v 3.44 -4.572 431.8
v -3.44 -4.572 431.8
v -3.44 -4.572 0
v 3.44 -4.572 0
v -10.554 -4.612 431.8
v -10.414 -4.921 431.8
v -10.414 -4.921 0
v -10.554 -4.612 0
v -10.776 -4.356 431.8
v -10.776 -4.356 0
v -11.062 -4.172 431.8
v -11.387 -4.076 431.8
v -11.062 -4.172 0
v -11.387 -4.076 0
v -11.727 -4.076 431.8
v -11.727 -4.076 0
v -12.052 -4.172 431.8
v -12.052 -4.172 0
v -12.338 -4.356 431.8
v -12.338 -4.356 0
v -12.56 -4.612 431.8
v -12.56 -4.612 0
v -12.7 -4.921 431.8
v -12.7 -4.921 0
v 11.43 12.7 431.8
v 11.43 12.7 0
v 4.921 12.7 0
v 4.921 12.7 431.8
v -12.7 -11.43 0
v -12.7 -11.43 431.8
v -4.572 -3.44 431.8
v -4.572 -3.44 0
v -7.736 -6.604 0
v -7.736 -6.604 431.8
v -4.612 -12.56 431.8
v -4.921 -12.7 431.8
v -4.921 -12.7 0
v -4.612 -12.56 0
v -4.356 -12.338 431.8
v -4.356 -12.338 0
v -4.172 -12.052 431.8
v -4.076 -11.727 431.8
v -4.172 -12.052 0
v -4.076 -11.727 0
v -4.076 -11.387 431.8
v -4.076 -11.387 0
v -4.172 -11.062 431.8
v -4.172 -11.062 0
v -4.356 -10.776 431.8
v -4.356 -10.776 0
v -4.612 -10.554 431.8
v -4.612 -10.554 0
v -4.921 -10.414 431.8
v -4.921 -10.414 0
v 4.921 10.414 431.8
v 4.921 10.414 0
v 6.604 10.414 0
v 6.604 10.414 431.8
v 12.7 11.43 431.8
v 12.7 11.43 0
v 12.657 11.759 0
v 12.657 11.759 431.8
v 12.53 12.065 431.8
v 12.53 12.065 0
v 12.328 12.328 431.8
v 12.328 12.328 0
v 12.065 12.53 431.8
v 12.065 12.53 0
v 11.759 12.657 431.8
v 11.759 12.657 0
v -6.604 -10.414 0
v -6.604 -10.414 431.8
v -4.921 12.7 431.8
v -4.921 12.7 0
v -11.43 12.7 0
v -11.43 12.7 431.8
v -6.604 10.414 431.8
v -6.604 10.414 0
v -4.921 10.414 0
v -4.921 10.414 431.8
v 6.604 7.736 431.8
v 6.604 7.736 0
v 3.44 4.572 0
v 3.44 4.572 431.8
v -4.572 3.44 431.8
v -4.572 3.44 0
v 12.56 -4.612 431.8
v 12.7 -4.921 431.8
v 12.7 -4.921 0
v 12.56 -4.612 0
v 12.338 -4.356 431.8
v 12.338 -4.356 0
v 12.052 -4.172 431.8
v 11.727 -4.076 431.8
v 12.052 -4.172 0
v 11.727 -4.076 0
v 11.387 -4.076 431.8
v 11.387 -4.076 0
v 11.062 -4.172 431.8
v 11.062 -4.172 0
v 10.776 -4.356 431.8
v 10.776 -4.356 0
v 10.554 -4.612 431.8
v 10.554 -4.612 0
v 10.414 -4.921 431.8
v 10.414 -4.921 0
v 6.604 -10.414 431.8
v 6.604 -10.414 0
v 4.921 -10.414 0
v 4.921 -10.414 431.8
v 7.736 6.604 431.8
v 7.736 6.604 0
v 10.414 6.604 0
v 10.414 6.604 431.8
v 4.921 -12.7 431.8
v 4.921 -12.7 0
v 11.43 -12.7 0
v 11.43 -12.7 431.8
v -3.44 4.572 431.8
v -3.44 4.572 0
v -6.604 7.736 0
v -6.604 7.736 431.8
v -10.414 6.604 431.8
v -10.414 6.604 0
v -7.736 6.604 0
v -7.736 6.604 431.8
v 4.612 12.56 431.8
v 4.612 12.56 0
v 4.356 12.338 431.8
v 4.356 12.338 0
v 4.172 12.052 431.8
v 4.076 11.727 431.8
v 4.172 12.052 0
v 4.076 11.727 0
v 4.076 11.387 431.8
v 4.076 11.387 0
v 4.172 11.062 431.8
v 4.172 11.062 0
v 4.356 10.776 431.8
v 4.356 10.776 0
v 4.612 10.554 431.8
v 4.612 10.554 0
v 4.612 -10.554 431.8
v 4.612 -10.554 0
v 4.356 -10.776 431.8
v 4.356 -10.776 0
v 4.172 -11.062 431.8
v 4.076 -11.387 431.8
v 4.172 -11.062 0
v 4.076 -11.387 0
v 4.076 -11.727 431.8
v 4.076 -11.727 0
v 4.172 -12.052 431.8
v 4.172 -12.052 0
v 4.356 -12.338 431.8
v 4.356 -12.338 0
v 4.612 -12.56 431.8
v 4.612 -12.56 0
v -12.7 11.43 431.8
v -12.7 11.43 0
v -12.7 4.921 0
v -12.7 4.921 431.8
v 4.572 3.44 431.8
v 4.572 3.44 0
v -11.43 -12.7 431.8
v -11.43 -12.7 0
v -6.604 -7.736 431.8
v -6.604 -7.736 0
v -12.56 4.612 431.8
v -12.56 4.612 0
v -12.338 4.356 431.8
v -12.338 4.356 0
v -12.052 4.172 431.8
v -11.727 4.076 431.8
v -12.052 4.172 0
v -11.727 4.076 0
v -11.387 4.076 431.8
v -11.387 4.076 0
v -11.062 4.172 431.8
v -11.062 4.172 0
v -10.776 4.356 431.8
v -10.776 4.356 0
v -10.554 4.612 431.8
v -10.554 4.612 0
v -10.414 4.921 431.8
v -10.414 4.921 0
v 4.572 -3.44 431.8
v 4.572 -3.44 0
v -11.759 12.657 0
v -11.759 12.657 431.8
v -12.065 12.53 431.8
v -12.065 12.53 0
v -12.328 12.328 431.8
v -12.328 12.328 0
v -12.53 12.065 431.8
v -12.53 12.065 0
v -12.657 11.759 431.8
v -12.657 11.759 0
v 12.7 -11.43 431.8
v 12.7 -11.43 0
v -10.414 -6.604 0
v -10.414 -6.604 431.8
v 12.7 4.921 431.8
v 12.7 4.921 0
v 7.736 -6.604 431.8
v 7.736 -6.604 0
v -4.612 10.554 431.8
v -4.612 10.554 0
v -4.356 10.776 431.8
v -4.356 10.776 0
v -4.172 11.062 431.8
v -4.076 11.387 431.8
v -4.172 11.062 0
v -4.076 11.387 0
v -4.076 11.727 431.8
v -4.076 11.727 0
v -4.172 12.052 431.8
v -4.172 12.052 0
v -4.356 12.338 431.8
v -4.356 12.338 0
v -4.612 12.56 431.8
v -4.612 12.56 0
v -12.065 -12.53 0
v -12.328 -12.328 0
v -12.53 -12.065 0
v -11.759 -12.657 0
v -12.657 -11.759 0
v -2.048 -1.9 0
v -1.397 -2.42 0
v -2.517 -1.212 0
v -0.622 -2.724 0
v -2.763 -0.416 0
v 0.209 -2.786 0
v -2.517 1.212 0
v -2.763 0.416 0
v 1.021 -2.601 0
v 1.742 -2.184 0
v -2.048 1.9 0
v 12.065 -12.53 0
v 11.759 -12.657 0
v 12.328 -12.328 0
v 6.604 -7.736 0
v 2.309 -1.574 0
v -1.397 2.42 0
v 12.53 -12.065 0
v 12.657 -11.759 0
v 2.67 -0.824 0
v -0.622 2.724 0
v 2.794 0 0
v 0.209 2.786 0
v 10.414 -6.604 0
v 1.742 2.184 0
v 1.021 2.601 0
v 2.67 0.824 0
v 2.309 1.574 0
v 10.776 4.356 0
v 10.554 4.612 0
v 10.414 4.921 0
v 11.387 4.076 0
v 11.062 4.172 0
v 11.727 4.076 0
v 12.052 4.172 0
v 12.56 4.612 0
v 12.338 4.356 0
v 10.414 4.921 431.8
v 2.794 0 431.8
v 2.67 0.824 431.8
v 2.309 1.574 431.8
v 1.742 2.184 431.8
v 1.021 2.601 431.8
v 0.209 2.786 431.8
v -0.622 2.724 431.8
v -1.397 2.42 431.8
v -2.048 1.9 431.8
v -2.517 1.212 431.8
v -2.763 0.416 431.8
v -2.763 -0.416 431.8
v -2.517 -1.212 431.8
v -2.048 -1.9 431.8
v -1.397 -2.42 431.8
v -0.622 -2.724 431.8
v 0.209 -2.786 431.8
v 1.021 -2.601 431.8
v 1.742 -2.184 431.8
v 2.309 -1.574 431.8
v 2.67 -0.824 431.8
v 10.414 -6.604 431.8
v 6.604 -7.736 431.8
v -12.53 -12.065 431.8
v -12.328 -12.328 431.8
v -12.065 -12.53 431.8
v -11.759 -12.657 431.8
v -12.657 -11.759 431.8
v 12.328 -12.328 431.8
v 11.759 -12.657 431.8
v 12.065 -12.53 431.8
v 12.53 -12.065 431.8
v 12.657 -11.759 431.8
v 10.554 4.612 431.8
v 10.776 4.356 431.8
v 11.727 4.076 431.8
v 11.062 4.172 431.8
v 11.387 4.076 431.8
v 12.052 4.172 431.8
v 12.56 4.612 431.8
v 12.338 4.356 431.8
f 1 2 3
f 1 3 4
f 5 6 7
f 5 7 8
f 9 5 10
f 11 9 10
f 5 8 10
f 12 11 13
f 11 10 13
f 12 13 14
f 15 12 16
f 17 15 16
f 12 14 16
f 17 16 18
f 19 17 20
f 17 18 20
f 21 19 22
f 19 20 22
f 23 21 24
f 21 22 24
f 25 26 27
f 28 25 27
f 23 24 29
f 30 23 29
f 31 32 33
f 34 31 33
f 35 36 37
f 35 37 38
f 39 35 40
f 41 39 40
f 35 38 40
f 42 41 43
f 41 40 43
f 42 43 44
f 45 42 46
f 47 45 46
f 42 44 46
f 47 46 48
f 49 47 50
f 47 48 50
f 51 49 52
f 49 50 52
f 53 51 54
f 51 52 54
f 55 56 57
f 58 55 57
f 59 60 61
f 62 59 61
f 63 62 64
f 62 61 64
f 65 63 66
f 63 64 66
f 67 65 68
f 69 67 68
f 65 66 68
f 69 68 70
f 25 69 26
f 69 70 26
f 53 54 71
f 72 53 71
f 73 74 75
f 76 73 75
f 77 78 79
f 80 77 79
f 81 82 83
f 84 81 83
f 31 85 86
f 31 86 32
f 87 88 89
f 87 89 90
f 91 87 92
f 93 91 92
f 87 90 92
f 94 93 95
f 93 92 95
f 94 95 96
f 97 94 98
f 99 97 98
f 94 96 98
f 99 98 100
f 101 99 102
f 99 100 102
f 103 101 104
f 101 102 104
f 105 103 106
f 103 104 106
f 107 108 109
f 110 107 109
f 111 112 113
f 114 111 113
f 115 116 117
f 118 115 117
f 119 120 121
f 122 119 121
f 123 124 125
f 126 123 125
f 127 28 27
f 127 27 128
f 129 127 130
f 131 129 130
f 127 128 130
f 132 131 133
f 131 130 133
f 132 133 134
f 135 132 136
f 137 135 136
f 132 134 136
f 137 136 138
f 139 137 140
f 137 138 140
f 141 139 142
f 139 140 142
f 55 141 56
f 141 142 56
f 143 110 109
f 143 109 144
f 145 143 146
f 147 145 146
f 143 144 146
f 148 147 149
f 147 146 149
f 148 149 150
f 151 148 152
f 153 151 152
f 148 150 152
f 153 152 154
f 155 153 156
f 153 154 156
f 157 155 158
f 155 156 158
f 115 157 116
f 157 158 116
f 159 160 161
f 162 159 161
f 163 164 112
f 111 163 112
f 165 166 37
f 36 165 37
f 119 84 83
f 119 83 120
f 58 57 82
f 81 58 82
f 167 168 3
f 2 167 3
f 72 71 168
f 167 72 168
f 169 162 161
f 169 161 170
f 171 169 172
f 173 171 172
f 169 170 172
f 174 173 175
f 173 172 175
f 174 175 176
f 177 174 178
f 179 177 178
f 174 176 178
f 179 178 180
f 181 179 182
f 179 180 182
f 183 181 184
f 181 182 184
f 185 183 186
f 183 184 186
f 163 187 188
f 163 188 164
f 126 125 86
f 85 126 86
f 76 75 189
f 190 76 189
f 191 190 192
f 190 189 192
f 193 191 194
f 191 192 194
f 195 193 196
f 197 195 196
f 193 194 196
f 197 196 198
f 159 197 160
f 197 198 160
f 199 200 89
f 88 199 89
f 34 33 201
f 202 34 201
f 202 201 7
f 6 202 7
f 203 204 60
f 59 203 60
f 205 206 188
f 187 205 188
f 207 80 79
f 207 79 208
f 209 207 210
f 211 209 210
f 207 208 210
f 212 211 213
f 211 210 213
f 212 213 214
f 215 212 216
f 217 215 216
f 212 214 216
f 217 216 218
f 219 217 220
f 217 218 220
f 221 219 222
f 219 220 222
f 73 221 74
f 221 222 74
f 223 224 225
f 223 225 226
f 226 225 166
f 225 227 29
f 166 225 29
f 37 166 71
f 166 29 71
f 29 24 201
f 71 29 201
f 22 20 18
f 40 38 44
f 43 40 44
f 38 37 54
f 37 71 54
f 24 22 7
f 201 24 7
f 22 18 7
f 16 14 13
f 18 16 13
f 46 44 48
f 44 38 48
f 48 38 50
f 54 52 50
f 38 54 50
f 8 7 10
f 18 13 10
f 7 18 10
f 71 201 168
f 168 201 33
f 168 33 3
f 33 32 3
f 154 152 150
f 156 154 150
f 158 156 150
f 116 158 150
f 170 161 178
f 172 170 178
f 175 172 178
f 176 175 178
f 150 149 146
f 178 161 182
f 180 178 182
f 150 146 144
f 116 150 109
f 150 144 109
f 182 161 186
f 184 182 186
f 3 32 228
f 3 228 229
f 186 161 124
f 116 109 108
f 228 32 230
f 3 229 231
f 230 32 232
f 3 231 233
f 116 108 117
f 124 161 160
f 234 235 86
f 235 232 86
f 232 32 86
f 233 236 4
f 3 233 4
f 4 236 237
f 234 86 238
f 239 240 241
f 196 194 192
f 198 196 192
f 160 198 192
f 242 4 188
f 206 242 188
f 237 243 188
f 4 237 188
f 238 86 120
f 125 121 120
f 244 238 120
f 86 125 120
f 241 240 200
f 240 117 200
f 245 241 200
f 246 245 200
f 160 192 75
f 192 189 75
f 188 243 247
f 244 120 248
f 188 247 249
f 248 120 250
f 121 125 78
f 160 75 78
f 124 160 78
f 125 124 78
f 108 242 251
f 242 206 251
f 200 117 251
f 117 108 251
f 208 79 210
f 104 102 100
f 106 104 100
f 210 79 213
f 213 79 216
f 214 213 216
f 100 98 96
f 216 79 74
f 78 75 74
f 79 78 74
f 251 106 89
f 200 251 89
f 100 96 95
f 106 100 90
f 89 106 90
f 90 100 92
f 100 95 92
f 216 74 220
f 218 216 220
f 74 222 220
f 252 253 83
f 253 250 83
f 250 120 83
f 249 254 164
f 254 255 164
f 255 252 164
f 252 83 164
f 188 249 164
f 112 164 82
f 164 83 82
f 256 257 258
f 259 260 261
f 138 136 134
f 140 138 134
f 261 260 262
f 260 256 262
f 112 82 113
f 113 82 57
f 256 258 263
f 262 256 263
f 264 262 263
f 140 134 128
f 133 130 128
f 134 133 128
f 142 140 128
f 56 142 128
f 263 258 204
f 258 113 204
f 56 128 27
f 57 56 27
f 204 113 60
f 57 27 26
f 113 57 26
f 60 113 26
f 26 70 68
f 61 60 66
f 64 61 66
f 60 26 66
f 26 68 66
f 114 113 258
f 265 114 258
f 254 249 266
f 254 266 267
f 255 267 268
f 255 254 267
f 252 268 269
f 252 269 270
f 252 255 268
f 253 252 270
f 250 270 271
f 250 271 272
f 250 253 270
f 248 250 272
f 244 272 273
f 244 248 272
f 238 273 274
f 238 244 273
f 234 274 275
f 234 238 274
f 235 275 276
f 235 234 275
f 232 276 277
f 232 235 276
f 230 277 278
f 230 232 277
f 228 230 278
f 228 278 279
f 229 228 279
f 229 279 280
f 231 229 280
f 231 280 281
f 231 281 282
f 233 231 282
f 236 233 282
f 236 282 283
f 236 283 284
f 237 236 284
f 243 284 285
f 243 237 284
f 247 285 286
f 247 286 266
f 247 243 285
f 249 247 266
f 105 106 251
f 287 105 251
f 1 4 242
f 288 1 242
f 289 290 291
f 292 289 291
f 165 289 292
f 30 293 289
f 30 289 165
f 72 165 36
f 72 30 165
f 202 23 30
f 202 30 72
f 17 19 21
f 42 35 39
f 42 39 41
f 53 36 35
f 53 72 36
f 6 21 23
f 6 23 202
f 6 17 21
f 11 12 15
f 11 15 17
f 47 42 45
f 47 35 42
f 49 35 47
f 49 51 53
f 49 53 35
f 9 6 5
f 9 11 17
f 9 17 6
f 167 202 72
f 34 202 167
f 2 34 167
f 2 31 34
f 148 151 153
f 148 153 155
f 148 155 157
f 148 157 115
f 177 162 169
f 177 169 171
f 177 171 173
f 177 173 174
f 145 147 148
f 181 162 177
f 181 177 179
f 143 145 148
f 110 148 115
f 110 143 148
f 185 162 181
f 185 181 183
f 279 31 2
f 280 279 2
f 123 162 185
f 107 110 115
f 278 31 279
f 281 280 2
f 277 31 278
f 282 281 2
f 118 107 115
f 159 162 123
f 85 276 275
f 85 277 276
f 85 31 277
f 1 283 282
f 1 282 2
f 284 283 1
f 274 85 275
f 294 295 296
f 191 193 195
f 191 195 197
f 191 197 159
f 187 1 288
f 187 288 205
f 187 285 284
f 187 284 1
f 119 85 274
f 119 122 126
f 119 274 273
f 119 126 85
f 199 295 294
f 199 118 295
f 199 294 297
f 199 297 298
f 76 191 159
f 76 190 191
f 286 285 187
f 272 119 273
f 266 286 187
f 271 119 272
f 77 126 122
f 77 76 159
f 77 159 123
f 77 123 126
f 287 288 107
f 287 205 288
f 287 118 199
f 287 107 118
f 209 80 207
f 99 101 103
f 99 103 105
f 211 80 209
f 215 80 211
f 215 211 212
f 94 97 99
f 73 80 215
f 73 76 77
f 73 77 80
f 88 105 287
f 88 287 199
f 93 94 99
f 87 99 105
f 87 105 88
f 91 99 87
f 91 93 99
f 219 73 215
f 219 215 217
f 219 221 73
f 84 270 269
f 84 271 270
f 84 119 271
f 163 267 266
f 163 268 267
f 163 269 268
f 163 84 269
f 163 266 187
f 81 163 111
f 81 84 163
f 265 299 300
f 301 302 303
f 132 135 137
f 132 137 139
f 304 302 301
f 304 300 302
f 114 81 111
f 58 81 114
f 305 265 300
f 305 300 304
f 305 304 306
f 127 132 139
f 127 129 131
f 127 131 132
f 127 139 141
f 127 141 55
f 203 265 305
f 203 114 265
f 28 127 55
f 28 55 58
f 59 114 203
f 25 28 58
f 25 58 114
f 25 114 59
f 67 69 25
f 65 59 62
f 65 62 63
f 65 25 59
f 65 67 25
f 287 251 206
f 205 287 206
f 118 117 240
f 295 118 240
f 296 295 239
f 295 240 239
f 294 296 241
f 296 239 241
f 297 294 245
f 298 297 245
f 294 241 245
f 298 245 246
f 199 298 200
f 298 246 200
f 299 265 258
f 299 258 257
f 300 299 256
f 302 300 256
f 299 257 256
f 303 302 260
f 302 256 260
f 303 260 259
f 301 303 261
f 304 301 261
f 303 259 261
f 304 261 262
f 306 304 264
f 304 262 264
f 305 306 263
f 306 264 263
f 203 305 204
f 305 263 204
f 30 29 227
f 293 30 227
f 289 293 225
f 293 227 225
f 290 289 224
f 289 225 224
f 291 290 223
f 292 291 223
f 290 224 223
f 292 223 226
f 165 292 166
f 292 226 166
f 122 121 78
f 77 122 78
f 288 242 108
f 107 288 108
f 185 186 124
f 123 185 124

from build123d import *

# Parameters (mm, degrees)
F0_R     = 2.794
F1_DEPTH = 431.8


with BuildPart() as f1:
    # F0 (on Top) → F1 (new body)
    with BuildSketch(Plane.XY):
        Polygon((4.572, -3.440488), (4.572, -4.572), (3.440488, -4.572), (6.604, -7.735512), (6.604, -10.414), (10.414, -10.414), (10.414, -6.604), (7.735512, -6.604), align=None)
        Polygon((3.440488, -4.572), (4.572, -4.572), (4.572, -3.440488), (4.572, 3.440488), (4.572, 4.572), (3.440488, 4.572), (-3.440488, 4.572), (-4.572, 4.572), (-4.572, 3.440488), (-4.572, -3.440488), (-4.572, -4.572), (-3.440488, -4.572), align=None)
        Circle(F0_R, mode=Mode.SUBTRACT)
        Polygon((-6.604, -7.735512), (-3.440488, -4.572), (-4.572, -4.572), (-4.572, -3.440488), (-7.735512, -6.604), (-10.414, -6.604), (-10.414, -10.414), (-6.604, -10.414), align=None)
        Polygon((4.572, 4.572), (4.572, 3.440488), (7.735512, 6.604), (10.414, 6.604), (10.414, 10.414), (6.604, 10.414), (6.604, 7.735512), (3.440488, 4.572), align=None)
        with BuildLine():
            Line((10.414, -10.414), (6.604, -10.414))
            Line((6.604, -10.414), (4.92125, -10.414))
            ThreePointArc((4.92125, -10.414), (4.064, -11.557), (4.92125, -12.7))
            Line((4.92125, -12.7), (10.414, -12.7))
            Line((10.414, -12.7), (10.414, -10.414))
        make_face()
        with BuildLine():
            Line((10.414, -4.92125), (10.414, -6.604))
            Line((10.414, -6.604), (10.414, -10.414))
            Line((10.414, -10.414), (12.7, -10.414))
            Line((12.7, -10.414), (12.7, -4.92125))
            ThreePointArc((12.7, -4.92125), (11.557, -4.064), (10.414, -4.92125))
        make_face()
        with BuildLine():
            Line((-4.92125, -10.414), (-6.604, -10.414))
            Line((-6.604, -10.414), (-10.414, -10.414))
            Line((-10.414, -10.414), (-10.414, -12.7))
            Line((-10.414, -12.7), (-4.92125, -12.7))
            ThreePointArc((-4.92125, -12.7), (-4.064, -11.557), (-4.92125, -10.414))
        make_face()
        with BuildLine():
            Line((12.7, -10.414), (10.414, -10.414))
            Line((10.414, -10.414), (10.414, -12.7))
            Line((10.414, -12.7), (11.43, -12.7))
            ThreePointArc((11.43, -12.7), (12.328026, -12.328026), (12.7, -11.43))
            Line((12.7, -11.43), (12.7, -10.414))
        make_face()
        with BuildLine():
            Line((10.414, 10.414), (10.414, 6.604))
            Line((10.414, 6.604), (10.414, 4.92125))
            ThreePointArc((10.414, 4.92125), (11.557, 4.064), (12.7, 4.92125))
            Line((12.7, 4.92125), (12.7, 10.414))
            Line((12.7, 10.414), (10.414, 10.414))
        make_face()
        Polygon((-7.735512, 6.604), (-4.572, 3.440488), (-4.572, 4.572), (-3.440488, 4.572), (-6.604, 7.735512), (-6.604, 10.414), (-10.414, 10.414), (-10.414, 6.604), align=None)
        with BuildLine():
            Line((-12.7, -10.414), (-10.414, -10.414))
            Line((-10.414, -10.414), (-10.414, -6.604))
            Line((-10.414, -6.604), (-10.414, -4.92125))
            ThreePointArc((-10.414, -4.92125), (-11.557, -4.064), (-12.7, -4.92125))
            Line((-12.7, -4.92125), (-12.7, -10.414))
        make_face()
        with BuildLine():
            Line((-10.414, -12.7), (-10.414, -10.414))
            Line((-10.414, -10.414), (-12.7, -10.414))
            Line((-12.7, -10.414), (-12.7, -11.43))
            ThreePointArc((-12.7, -11.43), (-12.328026, -12.328026), (-11.43, -12.7))
            Line((-11.43, -12.7), (-10.414, -12.7))
        make_face()
        with BuildLine():
            Line((10.414, 12.7), (10.414, 10.414))
            Line((10.414, 10.414), (12.7, 10.414))
            Line((12.7, 10.414), (12.7, 11.43))
            ThreePointArc((12.7, 11.43), (12.328026, 12.328026), (11.43, 12.7))
            Line((11.43, 12.7), (10.414, 12.7))
        make_face()
        with BuildLine():
            Line((6.604, 10.414), (10.414, 10.414))
            Line((10.414, 10.414), (10.414, 12.7))
            Line((10.414, 12.7), (4.92125, 12.7))
            ThreePointArc((4.92125, 12.7), (4.064, 11.557), (4.92125, 10.414))
            Line((4.92125, 10.414), (6.604, 10.414))
        make_face()
        with BuildLine():
            Line((-10.414, 4.92125), (-10.414, 6.604))
            Line((-10.414, 6.604), (-10.414, 10.414))
            Line((-10.414, 10.414), (-12.7, 10.414))
            Line((-12.7, 10.414), (-12.7, 4.92125))
            ThreePointArc((-12.7, 4.92125), (-11.557, 4.064), (-10.414, 4.92125))
        make_face()
        with BuildLine():
            Line((-10.414, 10.414), (-6.604, 10.414))
            Line((-6.604, 10.414), (-4.92125, 10.414))
            ThreePointArc((-4.92125, 10.414), (-4.064, 11.557), (-4.92125, 12.7))
            Line((-4.92125, 12.7), (-10.414, 12.7))
            Line((-10.414, 12.7), (-10.414, 10.414))
        make_face()
        with BuildLine():
            Line((-12.7, 10.414), (-10.414, 10.414))
            Line((-10.414, 10.414), (-10.414, 12.7))
            Line((-10.414, 12.7), (-11.43, 12.7))
            ThreePointArc((-11.43, 12.7), (-12.328026, 12.328026), (-12.7, 11.43))
            Line((-12.7, 11.43), (-12.7, 10.414))
        make_face()
    extrude(amount=F1_DEPTH)


solid = f1.part
